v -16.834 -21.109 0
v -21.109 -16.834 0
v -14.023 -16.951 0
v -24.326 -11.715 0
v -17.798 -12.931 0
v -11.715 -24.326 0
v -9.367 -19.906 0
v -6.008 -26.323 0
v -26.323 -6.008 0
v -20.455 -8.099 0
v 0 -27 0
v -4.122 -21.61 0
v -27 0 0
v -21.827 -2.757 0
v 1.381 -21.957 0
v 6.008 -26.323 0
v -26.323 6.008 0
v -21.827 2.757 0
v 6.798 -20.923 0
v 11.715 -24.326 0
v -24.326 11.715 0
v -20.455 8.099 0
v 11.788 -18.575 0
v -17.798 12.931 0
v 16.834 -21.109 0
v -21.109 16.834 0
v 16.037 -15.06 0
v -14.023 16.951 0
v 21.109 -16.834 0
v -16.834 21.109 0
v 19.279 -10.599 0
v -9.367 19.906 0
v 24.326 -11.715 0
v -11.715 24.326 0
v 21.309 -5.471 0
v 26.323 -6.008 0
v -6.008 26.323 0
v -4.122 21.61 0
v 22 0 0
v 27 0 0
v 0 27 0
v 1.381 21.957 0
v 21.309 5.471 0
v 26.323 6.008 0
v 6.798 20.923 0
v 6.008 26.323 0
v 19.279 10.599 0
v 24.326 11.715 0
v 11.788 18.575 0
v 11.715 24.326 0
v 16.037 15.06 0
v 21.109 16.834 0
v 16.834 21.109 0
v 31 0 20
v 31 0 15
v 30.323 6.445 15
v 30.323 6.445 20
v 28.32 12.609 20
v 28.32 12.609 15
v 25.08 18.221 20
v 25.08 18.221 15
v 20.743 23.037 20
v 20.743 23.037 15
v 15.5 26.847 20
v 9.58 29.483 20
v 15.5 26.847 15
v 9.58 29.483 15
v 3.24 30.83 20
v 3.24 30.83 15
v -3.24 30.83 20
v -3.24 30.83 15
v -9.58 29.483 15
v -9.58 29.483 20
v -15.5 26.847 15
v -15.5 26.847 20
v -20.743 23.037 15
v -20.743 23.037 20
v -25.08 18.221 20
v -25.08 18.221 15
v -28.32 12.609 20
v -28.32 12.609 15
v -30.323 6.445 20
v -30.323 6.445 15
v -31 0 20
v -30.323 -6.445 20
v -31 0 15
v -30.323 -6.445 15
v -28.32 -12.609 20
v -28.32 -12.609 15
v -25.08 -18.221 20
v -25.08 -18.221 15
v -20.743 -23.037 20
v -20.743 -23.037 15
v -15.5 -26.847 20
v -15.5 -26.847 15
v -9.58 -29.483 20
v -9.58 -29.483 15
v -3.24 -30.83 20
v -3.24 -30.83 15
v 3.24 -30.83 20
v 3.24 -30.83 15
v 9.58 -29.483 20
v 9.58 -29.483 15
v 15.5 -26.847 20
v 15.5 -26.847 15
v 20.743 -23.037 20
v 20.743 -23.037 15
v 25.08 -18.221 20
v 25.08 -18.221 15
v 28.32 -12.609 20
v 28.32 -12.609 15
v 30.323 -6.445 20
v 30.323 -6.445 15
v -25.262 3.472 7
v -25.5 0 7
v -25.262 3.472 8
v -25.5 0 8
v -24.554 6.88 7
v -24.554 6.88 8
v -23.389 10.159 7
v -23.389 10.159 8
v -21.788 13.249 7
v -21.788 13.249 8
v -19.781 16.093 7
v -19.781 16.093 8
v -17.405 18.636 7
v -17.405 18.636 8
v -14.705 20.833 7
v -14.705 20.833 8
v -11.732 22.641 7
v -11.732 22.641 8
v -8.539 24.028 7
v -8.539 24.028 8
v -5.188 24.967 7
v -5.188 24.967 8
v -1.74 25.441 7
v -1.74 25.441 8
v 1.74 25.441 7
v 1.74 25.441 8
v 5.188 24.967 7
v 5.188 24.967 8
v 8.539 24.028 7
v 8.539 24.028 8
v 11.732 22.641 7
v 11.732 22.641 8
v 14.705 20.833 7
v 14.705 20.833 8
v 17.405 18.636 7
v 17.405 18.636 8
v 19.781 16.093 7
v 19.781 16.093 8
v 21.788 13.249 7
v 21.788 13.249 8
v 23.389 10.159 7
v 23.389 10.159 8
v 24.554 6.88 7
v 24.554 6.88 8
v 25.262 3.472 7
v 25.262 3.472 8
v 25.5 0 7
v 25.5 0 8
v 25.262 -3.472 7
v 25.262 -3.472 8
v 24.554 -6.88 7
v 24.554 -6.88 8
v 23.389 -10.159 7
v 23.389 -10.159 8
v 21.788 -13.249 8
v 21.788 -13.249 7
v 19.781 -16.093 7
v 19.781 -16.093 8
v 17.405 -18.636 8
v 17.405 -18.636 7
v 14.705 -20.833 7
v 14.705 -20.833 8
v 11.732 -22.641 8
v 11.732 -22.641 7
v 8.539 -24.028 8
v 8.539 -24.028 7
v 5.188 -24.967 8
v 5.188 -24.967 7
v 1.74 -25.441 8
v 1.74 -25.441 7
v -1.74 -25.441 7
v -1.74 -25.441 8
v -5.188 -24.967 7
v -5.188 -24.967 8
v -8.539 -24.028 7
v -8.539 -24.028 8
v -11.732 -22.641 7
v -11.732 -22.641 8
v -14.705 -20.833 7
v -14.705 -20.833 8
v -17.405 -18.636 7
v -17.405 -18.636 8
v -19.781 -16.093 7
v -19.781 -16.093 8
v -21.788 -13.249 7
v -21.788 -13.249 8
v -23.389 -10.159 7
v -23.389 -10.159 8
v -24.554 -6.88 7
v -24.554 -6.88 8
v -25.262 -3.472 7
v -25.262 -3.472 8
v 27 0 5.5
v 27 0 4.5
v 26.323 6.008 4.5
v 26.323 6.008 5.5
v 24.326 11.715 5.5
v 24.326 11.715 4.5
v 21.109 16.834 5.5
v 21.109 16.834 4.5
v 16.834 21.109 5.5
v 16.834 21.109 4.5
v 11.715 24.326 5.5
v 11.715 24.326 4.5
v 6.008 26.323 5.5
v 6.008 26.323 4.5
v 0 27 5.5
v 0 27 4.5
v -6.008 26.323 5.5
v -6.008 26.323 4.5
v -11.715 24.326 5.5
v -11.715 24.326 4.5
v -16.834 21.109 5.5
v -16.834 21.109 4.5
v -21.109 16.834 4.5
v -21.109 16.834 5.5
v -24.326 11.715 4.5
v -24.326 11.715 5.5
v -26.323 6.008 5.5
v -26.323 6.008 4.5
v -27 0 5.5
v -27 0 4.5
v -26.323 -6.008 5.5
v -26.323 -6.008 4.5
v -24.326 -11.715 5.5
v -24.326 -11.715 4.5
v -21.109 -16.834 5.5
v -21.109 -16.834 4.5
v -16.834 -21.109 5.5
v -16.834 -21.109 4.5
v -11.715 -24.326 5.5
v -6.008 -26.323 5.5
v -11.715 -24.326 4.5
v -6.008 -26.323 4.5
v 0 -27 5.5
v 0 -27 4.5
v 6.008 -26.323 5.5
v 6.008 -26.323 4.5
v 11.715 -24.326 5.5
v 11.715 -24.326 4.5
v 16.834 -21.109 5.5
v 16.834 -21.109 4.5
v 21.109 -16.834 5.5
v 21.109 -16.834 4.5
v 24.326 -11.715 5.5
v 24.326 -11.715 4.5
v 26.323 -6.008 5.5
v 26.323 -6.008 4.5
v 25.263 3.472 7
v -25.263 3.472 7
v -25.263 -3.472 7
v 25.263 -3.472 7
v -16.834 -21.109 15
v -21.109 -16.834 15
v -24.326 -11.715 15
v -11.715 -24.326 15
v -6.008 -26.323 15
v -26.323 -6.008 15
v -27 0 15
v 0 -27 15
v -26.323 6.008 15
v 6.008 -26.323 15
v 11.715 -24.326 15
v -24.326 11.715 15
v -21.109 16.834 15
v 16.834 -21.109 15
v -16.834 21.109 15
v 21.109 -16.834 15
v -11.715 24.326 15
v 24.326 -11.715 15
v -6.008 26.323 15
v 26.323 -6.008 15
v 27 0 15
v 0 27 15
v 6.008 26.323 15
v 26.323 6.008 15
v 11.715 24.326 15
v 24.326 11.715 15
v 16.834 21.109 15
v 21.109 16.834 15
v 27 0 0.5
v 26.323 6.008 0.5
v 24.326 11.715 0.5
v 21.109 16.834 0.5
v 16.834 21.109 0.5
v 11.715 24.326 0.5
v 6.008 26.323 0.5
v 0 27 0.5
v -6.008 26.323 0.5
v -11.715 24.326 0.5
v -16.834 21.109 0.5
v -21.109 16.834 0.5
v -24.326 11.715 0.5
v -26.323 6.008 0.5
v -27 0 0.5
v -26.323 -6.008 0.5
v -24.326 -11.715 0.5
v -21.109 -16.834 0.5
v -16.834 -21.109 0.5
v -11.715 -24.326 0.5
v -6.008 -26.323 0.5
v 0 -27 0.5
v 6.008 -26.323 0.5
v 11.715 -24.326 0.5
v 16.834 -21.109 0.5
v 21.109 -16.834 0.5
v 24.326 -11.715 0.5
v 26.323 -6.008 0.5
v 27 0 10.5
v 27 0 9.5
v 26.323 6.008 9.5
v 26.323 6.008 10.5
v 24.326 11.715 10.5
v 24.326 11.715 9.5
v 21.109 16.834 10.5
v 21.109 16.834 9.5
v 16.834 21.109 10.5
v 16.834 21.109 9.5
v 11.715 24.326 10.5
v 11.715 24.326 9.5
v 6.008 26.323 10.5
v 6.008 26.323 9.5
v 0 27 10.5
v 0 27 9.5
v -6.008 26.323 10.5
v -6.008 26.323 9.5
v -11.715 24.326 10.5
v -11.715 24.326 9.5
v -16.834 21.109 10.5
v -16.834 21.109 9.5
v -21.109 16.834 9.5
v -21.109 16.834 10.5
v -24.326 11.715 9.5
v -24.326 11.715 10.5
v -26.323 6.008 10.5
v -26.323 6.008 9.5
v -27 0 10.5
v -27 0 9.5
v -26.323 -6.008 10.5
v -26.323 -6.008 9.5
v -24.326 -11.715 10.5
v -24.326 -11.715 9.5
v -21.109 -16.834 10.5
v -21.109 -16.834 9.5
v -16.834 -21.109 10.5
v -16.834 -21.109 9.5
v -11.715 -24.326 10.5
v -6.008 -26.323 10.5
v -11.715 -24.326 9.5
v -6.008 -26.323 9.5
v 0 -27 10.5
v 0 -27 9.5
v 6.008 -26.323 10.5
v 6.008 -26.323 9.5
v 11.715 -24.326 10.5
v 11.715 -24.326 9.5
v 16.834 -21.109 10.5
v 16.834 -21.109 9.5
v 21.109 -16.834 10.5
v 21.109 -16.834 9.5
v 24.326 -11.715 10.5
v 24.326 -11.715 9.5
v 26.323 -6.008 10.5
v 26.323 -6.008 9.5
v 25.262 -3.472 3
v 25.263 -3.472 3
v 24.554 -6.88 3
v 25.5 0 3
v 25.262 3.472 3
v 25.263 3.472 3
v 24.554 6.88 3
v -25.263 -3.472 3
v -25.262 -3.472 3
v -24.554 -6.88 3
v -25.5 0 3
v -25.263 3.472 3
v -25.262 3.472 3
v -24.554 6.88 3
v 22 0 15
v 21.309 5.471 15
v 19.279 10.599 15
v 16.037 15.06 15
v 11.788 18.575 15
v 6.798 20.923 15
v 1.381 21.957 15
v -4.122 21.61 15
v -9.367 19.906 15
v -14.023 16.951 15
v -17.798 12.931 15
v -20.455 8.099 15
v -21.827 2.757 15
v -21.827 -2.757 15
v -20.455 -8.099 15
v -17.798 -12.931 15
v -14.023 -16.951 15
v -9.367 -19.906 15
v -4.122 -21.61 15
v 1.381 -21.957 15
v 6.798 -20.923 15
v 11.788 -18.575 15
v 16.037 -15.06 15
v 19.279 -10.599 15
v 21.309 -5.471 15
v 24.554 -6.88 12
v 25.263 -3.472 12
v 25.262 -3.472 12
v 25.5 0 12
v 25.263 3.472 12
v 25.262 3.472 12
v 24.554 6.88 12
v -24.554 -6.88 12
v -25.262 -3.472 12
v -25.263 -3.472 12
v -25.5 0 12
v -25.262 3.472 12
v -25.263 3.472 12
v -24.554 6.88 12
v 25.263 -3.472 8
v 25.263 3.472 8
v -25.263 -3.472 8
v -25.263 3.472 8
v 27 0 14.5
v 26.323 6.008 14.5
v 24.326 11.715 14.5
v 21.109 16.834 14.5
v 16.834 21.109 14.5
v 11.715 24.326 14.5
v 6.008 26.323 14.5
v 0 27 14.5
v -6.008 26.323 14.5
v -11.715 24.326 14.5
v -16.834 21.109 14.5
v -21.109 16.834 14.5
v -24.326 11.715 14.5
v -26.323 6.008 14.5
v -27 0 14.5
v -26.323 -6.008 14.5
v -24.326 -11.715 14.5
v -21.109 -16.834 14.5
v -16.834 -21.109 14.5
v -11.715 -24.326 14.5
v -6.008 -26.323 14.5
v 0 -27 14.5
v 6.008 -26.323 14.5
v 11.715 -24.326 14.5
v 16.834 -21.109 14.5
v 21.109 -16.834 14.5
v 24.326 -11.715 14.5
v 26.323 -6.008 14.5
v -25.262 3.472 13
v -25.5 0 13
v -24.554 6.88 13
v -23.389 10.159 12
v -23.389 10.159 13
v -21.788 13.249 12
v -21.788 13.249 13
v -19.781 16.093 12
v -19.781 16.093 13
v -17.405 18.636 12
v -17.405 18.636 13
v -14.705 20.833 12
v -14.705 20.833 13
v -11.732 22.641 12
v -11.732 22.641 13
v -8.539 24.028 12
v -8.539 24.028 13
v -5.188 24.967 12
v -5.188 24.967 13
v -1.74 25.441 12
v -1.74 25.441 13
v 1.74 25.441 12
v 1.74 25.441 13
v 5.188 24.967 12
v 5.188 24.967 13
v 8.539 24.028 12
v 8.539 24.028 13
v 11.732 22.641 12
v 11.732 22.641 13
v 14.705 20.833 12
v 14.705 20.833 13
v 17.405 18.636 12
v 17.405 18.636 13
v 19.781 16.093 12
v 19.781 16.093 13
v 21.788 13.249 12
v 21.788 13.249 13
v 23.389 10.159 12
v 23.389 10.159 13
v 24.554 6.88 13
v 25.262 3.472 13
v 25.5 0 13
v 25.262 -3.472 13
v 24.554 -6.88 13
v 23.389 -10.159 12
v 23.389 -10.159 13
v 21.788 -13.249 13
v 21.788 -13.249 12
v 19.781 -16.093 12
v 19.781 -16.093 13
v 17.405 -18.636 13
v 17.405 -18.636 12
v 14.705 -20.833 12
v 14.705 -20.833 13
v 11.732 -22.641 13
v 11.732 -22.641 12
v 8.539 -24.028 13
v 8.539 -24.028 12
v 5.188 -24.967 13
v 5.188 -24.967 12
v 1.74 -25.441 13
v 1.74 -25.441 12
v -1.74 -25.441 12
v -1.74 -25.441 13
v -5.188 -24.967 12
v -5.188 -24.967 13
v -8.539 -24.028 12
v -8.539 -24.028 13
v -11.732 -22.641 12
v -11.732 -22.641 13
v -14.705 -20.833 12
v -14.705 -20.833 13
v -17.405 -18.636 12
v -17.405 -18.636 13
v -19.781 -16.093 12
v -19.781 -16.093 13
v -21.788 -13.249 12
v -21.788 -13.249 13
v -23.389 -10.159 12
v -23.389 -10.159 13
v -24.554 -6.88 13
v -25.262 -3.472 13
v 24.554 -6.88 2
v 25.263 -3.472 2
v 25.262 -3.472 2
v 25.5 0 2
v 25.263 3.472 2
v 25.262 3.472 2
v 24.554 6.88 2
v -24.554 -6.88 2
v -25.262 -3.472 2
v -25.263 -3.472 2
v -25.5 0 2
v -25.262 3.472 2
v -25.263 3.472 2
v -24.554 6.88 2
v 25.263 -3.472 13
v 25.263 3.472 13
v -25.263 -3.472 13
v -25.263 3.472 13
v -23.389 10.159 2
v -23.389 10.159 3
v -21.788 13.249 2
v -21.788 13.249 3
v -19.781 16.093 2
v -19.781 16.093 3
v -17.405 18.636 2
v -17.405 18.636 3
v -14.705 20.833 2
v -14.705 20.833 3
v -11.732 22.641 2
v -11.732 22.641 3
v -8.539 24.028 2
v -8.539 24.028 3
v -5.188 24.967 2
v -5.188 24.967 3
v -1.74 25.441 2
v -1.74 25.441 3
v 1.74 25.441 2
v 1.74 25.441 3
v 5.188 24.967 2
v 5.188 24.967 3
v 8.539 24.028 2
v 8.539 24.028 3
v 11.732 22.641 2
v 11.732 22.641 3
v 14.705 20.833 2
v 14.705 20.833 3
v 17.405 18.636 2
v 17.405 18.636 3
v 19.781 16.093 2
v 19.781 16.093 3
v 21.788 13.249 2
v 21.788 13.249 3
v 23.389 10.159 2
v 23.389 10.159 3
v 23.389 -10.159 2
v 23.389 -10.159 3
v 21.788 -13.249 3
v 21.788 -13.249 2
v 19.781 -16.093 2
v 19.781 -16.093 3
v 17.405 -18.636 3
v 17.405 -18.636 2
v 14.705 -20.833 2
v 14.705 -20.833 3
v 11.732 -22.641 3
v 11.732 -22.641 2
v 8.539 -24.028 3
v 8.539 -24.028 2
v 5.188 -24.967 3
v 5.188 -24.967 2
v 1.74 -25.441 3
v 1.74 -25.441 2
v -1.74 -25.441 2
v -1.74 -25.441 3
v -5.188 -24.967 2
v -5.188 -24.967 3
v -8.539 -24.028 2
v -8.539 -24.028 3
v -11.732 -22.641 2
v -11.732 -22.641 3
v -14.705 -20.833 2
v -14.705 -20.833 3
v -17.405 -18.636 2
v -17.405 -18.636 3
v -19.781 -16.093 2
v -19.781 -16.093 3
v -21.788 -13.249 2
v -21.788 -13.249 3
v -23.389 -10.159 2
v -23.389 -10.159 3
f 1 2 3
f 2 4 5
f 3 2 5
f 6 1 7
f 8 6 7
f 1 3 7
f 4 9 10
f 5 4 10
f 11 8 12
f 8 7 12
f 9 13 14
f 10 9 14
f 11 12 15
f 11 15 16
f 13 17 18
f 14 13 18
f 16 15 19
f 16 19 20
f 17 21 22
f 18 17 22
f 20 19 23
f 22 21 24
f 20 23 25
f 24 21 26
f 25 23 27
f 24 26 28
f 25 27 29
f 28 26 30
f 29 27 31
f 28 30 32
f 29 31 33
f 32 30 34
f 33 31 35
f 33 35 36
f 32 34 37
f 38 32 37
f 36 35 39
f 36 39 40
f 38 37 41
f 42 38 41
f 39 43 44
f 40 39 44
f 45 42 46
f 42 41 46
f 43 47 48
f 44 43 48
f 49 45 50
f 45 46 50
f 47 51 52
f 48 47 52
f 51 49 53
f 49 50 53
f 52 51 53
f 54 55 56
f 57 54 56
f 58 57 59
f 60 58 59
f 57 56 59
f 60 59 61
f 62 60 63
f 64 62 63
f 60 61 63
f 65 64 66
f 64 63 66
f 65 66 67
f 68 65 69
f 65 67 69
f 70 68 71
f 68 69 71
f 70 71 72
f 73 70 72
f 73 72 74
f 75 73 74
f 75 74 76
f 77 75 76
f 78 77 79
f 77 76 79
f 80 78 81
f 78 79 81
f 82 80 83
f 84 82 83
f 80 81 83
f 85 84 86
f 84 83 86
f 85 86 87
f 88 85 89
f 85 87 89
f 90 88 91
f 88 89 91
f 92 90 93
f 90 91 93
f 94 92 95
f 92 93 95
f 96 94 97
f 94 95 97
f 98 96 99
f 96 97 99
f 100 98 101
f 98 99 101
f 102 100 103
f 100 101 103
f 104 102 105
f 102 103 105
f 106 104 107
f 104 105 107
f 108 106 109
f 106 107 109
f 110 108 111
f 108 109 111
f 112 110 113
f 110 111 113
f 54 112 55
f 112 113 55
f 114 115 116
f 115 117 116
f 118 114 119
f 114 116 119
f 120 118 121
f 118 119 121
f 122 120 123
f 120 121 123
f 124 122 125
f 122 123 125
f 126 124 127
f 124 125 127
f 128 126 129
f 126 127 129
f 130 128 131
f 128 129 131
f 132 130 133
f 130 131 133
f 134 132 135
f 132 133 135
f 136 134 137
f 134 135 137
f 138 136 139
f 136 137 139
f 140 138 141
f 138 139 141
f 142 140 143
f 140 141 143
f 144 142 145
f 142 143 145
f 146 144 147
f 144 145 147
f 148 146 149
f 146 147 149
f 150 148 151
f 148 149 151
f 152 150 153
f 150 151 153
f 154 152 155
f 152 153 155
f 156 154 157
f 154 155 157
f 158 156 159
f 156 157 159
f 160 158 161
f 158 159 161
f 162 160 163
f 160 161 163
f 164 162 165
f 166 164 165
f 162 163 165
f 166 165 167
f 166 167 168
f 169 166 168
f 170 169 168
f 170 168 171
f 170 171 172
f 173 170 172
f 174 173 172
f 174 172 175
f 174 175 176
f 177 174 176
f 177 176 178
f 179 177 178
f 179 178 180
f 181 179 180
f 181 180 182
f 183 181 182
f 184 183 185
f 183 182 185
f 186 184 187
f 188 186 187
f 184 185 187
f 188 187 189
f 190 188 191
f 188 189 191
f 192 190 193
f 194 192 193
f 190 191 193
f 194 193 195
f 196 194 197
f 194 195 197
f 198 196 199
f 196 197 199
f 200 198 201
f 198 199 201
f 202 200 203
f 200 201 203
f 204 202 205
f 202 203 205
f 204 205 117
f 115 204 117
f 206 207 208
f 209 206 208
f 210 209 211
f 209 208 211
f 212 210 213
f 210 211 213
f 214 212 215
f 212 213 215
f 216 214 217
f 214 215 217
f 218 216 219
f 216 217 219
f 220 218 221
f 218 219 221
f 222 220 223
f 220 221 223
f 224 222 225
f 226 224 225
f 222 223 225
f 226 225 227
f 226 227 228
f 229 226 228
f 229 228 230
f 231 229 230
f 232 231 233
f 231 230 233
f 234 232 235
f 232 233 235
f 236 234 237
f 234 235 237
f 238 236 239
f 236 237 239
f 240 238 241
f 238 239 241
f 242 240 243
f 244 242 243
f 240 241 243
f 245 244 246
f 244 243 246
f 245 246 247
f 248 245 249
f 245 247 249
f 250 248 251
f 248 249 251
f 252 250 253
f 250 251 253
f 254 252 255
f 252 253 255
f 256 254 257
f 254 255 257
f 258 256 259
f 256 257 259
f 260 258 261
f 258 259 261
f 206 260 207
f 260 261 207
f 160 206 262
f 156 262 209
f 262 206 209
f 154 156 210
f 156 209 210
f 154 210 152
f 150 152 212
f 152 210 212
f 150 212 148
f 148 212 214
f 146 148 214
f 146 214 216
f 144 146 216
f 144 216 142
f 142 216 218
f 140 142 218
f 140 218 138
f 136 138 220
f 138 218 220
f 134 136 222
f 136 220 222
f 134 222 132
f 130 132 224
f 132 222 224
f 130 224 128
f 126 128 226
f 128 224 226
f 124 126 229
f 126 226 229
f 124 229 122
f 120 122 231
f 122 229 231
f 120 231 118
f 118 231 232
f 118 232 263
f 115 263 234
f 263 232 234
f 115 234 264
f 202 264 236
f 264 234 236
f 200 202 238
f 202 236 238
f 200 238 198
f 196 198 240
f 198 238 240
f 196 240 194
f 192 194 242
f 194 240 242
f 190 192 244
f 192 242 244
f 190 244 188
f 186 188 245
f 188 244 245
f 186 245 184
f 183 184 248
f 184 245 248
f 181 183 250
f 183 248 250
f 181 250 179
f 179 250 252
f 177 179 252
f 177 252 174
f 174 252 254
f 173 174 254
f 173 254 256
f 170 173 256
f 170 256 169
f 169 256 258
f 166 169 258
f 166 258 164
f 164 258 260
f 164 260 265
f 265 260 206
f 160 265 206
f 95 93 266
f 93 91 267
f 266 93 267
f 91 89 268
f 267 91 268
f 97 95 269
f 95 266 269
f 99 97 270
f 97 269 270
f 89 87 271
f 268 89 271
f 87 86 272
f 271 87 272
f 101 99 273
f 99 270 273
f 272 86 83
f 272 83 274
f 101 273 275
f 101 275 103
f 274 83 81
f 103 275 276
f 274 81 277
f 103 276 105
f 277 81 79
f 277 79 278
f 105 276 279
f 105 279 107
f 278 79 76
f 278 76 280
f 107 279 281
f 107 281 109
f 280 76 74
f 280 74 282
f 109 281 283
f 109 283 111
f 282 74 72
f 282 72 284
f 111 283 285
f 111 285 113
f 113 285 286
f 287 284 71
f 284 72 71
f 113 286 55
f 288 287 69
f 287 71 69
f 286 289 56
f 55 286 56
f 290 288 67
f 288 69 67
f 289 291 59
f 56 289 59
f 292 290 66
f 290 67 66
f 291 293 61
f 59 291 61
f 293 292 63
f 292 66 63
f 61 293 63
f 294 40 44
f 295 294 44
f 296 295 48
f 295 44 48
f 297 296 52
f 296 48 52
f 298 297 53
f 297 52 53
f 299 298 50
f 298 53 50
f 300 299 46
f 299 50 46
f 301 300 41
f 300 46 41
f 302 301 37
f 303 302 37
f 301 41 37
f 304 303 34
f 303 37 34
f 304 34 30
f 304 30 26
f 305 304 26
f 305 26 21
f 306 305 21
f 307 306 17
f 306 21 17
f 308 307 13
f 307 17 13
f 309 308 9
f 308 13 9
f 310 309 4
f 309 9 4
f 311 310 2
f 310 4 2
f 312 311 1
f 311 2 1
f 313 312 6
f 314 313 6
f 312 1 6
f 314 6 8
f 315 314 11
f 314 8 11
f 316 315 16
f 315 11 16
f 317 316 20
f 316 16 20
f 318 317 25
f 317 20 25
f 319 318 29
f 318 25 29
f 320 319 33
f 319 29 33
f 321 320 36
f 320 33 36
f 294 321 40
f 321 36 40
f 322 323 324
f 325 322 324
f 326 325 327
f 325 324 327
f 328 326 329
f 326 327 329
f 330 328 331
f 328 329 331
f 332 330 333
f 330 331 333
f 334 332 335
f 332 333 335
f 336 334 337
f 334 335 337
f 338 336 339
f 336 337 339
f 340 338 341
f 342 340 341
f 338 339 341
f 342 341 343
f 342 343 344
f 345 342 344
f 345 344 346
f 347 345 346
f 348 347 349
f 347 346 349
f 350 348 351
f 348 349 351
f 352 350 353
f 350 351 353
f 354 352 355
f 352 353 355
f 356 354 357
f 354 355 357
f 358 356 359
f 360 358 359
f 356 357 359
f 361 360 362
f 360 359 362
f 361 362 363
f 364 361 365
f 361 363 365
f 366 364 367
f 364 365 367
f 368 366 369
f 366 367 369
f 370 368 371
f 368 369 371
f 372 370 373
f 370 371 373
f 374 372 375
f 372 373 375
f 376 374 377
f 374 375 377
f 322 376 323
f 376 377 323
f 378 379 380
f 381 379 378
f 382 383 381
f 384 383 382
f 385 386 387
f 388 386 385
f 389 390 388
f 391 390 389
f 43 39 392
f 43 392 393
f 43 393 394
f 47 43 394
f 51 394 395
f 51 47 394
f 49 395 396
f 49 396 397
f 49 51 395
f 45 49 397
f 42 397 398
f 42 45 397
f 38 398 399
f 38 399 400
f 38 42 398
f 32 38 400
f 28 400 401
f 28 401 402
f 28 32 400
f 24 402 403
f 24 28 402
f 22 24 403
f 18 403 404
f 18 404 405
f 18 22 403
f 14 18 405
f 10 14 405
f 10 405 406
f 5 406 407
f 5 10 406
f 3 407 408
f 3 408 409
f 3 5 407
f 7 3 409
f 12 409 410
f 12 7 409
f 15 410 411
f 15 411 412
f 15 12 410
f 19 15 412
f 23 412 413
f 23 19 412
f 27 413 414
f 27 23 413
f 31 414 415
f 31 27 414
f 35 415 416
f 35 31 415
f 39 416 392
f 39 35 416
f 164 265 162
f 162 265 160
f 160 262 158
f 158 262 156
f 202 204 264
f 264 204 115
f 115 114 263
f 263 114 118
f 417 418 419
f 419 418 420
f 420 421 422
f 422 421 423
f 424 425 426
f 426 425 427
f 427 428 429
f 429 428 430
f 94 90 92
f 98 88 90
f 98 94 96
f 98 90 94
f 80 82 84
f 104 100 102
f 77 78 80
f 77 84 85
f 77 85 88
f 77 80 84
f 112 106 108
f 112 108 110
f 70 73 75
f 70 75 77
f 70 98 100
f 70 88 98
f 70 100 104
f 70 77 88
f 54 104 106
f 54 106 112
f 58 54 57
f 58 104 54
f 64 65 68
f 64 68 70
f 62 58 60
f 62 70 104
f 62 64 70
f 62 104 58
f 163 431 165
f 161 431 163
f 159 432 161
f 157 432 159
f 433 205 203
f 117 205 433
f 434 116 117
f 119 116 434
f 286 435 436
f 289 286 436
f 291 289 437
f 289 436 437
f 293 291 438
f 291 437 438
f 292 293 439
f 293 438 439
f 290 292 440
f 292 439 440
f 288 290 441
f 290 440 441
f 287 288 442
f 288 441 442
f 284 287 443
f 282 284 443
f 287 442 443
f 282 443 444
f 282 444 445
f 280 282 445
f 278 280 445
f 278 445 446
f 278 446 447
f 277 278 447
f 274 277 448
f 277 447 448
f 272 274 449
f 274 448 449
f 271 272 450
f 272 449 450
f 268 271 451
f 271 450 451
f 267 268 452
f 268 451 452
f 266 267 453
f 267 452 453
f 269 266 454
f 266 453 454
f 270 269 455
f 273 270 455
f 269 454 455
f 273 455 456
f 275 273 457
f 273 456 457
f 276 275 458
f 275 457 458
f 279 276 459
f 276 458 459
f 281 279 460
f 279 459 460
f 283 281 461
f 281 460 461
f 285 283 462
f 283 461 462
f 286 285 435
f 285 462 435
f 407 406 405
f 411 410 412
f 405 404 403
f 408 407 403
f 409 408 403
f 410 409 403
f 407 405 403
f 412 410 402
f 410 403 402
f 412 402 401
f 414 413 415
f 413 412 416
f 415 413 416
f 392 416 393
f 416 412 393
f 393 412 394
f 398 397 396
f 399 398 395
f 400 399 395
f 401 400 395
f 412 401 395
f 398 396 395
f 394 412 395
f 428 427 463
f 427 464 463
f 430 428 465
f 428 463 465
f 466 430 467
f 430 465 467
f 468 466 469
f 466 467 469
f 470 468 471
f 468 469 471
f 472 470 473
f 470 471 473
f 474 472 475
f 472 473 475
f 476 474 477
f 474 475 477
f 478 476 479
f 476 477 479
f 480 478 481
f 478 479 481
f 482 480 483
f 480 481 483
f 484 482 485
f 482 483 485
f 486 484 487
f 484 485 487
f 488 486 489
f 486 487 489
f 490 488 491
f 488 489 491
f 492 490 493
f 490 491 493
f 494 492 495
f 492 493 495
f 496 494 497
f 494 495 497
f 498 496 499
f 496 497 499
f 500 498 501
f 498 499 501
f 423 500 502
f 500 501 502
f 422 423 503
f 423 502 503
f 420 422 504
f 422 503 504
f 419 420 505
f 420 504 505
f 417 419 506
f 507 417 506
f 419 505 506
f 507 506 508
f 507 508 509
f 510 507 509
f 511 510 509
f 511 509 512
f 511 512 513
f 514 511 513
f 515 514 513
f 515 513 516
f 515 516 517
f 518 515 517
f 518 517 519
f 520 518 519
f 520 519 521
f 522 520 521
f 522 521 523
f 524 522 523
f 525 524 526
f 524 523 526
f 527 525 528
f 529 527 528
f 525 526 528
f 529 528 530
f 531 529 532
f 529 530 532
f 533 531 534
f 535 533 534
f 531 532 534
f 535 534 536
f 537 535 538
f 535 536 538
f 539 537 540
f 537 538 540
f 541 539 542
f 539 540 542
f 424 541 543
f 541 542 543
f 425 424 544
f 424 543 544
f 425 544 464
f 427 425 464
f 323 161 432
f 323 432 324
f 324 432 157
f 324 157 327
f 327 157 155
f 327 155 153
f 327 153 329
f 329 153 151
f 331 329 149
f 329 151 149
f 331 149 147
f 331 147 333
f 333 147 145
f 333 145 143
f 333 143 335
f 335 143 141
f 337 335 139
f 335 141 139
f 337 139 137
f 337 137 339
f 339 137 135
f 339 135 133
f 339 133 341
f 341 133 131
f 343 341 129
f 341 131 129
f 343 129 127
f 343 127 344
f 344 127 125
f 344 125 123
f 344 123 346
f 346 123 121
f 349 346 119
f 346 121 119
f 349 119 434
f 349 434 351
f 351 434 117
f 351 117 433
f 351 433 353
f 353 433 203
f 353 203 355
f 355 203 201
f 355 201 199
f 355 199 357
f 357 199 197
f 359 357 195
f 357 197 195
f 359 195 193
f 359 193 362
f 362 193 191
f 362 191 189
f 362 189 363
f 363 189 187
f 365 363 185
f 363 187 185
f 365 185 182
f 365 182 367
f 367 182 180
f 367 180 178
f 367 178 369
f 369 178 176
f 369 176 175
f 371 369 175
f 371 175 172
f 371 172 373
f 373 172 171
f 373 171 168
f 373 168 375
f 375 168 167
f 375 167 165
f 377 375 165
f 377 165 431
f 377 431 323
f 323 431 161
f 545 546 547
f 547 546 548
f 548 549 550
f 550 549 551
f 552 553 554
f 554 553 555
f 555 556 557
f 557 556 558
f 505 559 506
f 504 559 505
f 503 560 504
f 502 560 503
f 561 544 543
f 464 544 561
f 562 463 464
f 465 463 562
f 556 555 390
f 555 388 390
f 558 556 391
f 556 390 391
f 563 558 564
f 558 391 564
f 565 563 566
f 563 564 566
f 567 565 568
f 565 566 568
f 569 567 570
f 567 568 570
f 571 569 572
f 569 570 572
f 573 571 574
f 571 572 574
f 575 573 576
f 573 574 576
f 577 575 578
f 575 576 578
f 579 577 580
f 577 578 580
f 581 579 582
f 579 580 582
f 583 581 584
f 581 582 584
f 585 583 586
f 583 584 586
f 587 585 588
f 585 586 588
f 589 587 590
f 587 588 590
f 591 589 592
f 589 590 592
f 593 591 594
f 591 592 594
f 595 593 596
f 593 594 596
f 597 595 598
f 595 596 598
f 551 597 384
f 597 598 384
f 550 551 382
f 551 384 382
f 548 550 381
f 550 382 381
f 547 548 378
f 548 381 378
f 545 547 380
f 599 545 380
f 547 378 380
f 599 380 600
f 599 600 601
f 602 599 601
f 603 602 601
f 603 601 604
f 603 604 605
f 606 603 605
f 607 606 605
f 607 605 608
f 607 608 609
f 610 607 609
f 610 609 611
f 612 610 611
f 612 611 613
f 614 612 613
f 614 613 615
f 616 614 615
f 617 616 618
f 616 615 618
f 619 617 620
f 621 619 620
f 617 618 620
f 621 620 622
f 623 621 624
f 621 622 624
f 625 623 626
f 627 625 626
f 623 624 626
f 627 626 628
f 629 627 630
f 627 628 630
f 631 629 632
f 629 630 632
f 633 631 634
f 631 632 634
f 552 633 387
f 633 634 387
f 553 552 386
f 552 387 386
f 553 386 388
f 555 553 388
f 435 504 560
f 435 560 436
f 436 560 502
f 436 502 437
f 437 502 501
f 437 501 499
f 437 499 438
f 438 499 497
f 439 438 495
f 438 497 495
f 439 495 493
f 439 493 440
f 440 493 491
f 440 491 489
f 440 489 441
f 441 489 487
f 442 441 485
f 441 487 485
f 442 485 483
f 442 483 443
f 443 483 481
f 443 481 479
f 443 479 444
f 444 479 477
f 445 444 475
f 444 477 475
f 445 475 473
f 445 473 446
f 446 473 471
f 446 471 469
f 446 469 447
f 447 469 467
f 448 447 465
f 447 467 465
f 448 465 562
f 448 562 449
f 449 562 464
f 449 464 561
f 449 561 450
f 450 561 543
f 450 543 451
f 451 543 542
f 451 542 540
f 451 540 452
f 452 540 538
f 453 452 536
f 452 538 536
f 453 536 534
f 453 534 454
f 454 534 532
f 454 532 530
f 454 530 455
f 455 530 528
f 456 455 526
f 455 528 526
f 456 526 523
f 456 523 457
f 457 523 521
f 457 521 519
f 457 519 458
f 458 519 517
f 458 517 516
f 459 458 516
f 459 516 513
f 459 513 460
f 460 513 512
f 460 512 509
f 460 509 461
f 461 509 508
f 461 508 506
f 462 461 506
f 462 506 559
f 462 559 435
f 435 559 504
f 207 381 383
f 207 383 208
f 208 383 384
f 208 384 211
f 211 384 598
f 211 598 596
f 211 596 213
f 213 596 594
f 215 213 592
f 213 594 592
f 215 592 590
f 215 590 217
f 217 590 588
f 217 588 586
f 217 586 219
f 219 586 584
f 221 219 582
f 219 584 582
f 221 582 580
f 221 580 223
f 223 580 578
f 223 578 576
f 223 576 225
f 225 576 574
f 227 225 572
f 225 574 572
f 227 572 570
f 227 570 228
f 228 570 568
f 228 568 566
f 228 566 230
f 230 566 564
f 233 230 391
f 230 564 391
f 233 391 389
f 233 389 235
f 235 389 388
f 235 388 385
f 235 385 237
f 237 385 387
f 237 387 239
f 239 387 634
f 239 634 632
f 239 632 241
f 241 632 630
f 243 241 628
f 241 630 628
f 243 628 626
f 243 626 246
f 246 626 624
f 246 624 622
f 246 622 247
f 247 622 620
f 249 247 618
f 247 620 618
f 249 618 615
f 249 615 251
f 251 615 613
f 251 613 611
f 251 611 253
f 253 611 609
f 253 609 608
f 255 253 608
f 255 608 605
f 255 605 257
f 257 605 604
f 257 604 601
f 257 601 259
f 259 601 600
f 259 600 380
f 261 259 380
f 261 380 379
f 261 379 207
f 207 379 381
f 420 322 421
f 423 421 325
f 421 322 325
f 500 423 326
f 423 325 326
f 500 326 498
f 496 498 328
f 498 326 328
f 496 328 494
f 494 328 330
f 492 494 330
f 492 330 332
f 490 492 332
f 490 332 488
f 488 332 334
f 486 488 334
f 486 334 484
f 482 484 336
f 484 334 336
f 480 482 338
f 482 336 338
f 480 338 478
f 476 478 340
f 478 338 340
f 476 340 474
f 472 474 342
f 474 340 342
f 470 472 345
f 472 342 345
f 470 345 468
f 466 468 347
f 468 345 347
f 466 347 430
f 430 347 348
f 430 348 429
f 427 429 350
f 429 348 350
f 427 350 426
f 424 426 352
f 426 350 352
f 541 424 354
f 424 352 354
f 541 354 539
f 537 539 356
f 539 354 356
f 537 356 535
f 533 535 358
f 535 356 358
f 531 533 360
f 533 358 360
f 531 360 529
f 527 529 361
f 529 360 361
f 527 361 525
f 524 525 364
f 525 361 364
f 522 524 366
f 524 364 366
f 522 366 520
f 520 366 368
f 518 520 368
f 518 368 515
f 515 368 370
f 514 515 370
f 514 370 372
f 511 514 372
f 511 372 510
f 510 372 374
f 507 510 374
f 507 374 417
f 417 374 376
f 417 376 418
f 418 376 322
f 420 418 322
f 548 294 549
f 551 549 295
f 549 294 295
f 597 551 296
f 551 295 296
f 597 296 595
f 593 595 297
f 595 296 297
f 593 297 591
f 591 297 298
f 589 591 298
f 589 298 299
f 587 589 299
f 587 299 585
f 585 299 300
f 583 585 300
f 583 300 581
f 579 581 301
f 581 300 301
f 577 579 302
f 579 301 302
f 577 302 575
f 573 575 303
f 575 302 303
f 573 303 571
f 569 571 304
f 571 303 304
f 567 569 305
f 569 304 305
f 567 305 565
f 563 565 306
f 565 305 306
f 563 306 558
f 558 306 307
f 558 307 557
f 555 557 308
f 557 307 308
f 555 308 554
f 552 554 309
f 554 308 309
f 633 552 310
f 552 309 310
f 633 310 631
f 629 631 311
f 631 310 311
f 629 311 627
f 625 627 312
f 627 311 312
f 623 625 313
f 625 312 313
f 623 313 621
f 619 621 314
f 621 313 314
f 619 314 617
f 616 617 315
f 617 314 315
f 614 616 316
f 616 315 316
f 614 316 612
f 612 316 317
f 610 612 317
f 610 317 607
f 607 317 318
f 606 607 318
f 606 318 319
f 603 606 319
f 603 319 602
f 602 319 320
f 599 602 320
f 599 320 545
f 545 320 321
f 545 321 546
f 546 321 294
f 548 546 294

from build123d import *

# Parameters (mm, degrees)
F0_R     = 27
F0_R_2   = 22
F1_DEPTH = 15
F2_R     = 31
F2_R_2   = 27
F2_R_3   = 22
F3_DEPTH = 5
F4_W     = 1.5
F4_H     = 1
F6_SIZE2 = 1.49999
F6_SIZE  = 1.49999


# Not quite as in the source:
# - a fillet or chamfer is up to 0.001 mm smaller than in the source, because OpenCascade refuses the exact size


with BuildPart() as f1:
    # F0 (on Top) → F1 (new body)
    with BuildSketch(Plane.XY):
        Circle(F0_R)
        Circle(F0_R_2, mode=Mode.SUBTRACT)
    extrude(amount=F1_DEPTH)

    # F2 (on face) → F3 (join)
    with BuildSketch(Plane.XY.offset(15)):
        Circle(F2_R)
        Circle(F2_R_2, mode=Mode.SUBTRACT)
        Circle(F2_R_2)
        Circle(F2_R_3, mode=Mode.SUBTRACT)
        Circle(F2_R_3)
    extrude(amount=F3_DEPTH)

    # F4 (on Front) → F5 (revolve, cut)
    with BuildSketch(Plane.XZ):
        with Locations((-26.25, 2.5)):
            Rectangle(F4_W, F4_H)
        with Locations((-26.25, 7.5)):
            Rectangle(F4_W, F4_H)
        with Locations((-26.25, 12.5)):
            Rectangle(F4_W, F4_H)
    revolve(axis=Axis((0, 0, 9.1704530641), (0, 0, -1)), mode=Mode.SUBTRACT)

    # F6 (size 1.5 and 1.5 in the source; OpenCascade refuses exactly that, so slightly less here)
    f6_edges = [f1.edges().sort_by_distance(p)[0] for p in [
        (-27, 0, 3),
        (27, 0, 5),
        (-27, 0, 7),
        (-27, 0, 2),
        (-27, 0, 8),
        (27, 0, 10),
        (-27, 0, 12),
        (-27, 0, 13),
    ]]
    chamfer(f6_edges, length=F6_SIZE, length2=F6_SIZE2)


solid = f1.part
